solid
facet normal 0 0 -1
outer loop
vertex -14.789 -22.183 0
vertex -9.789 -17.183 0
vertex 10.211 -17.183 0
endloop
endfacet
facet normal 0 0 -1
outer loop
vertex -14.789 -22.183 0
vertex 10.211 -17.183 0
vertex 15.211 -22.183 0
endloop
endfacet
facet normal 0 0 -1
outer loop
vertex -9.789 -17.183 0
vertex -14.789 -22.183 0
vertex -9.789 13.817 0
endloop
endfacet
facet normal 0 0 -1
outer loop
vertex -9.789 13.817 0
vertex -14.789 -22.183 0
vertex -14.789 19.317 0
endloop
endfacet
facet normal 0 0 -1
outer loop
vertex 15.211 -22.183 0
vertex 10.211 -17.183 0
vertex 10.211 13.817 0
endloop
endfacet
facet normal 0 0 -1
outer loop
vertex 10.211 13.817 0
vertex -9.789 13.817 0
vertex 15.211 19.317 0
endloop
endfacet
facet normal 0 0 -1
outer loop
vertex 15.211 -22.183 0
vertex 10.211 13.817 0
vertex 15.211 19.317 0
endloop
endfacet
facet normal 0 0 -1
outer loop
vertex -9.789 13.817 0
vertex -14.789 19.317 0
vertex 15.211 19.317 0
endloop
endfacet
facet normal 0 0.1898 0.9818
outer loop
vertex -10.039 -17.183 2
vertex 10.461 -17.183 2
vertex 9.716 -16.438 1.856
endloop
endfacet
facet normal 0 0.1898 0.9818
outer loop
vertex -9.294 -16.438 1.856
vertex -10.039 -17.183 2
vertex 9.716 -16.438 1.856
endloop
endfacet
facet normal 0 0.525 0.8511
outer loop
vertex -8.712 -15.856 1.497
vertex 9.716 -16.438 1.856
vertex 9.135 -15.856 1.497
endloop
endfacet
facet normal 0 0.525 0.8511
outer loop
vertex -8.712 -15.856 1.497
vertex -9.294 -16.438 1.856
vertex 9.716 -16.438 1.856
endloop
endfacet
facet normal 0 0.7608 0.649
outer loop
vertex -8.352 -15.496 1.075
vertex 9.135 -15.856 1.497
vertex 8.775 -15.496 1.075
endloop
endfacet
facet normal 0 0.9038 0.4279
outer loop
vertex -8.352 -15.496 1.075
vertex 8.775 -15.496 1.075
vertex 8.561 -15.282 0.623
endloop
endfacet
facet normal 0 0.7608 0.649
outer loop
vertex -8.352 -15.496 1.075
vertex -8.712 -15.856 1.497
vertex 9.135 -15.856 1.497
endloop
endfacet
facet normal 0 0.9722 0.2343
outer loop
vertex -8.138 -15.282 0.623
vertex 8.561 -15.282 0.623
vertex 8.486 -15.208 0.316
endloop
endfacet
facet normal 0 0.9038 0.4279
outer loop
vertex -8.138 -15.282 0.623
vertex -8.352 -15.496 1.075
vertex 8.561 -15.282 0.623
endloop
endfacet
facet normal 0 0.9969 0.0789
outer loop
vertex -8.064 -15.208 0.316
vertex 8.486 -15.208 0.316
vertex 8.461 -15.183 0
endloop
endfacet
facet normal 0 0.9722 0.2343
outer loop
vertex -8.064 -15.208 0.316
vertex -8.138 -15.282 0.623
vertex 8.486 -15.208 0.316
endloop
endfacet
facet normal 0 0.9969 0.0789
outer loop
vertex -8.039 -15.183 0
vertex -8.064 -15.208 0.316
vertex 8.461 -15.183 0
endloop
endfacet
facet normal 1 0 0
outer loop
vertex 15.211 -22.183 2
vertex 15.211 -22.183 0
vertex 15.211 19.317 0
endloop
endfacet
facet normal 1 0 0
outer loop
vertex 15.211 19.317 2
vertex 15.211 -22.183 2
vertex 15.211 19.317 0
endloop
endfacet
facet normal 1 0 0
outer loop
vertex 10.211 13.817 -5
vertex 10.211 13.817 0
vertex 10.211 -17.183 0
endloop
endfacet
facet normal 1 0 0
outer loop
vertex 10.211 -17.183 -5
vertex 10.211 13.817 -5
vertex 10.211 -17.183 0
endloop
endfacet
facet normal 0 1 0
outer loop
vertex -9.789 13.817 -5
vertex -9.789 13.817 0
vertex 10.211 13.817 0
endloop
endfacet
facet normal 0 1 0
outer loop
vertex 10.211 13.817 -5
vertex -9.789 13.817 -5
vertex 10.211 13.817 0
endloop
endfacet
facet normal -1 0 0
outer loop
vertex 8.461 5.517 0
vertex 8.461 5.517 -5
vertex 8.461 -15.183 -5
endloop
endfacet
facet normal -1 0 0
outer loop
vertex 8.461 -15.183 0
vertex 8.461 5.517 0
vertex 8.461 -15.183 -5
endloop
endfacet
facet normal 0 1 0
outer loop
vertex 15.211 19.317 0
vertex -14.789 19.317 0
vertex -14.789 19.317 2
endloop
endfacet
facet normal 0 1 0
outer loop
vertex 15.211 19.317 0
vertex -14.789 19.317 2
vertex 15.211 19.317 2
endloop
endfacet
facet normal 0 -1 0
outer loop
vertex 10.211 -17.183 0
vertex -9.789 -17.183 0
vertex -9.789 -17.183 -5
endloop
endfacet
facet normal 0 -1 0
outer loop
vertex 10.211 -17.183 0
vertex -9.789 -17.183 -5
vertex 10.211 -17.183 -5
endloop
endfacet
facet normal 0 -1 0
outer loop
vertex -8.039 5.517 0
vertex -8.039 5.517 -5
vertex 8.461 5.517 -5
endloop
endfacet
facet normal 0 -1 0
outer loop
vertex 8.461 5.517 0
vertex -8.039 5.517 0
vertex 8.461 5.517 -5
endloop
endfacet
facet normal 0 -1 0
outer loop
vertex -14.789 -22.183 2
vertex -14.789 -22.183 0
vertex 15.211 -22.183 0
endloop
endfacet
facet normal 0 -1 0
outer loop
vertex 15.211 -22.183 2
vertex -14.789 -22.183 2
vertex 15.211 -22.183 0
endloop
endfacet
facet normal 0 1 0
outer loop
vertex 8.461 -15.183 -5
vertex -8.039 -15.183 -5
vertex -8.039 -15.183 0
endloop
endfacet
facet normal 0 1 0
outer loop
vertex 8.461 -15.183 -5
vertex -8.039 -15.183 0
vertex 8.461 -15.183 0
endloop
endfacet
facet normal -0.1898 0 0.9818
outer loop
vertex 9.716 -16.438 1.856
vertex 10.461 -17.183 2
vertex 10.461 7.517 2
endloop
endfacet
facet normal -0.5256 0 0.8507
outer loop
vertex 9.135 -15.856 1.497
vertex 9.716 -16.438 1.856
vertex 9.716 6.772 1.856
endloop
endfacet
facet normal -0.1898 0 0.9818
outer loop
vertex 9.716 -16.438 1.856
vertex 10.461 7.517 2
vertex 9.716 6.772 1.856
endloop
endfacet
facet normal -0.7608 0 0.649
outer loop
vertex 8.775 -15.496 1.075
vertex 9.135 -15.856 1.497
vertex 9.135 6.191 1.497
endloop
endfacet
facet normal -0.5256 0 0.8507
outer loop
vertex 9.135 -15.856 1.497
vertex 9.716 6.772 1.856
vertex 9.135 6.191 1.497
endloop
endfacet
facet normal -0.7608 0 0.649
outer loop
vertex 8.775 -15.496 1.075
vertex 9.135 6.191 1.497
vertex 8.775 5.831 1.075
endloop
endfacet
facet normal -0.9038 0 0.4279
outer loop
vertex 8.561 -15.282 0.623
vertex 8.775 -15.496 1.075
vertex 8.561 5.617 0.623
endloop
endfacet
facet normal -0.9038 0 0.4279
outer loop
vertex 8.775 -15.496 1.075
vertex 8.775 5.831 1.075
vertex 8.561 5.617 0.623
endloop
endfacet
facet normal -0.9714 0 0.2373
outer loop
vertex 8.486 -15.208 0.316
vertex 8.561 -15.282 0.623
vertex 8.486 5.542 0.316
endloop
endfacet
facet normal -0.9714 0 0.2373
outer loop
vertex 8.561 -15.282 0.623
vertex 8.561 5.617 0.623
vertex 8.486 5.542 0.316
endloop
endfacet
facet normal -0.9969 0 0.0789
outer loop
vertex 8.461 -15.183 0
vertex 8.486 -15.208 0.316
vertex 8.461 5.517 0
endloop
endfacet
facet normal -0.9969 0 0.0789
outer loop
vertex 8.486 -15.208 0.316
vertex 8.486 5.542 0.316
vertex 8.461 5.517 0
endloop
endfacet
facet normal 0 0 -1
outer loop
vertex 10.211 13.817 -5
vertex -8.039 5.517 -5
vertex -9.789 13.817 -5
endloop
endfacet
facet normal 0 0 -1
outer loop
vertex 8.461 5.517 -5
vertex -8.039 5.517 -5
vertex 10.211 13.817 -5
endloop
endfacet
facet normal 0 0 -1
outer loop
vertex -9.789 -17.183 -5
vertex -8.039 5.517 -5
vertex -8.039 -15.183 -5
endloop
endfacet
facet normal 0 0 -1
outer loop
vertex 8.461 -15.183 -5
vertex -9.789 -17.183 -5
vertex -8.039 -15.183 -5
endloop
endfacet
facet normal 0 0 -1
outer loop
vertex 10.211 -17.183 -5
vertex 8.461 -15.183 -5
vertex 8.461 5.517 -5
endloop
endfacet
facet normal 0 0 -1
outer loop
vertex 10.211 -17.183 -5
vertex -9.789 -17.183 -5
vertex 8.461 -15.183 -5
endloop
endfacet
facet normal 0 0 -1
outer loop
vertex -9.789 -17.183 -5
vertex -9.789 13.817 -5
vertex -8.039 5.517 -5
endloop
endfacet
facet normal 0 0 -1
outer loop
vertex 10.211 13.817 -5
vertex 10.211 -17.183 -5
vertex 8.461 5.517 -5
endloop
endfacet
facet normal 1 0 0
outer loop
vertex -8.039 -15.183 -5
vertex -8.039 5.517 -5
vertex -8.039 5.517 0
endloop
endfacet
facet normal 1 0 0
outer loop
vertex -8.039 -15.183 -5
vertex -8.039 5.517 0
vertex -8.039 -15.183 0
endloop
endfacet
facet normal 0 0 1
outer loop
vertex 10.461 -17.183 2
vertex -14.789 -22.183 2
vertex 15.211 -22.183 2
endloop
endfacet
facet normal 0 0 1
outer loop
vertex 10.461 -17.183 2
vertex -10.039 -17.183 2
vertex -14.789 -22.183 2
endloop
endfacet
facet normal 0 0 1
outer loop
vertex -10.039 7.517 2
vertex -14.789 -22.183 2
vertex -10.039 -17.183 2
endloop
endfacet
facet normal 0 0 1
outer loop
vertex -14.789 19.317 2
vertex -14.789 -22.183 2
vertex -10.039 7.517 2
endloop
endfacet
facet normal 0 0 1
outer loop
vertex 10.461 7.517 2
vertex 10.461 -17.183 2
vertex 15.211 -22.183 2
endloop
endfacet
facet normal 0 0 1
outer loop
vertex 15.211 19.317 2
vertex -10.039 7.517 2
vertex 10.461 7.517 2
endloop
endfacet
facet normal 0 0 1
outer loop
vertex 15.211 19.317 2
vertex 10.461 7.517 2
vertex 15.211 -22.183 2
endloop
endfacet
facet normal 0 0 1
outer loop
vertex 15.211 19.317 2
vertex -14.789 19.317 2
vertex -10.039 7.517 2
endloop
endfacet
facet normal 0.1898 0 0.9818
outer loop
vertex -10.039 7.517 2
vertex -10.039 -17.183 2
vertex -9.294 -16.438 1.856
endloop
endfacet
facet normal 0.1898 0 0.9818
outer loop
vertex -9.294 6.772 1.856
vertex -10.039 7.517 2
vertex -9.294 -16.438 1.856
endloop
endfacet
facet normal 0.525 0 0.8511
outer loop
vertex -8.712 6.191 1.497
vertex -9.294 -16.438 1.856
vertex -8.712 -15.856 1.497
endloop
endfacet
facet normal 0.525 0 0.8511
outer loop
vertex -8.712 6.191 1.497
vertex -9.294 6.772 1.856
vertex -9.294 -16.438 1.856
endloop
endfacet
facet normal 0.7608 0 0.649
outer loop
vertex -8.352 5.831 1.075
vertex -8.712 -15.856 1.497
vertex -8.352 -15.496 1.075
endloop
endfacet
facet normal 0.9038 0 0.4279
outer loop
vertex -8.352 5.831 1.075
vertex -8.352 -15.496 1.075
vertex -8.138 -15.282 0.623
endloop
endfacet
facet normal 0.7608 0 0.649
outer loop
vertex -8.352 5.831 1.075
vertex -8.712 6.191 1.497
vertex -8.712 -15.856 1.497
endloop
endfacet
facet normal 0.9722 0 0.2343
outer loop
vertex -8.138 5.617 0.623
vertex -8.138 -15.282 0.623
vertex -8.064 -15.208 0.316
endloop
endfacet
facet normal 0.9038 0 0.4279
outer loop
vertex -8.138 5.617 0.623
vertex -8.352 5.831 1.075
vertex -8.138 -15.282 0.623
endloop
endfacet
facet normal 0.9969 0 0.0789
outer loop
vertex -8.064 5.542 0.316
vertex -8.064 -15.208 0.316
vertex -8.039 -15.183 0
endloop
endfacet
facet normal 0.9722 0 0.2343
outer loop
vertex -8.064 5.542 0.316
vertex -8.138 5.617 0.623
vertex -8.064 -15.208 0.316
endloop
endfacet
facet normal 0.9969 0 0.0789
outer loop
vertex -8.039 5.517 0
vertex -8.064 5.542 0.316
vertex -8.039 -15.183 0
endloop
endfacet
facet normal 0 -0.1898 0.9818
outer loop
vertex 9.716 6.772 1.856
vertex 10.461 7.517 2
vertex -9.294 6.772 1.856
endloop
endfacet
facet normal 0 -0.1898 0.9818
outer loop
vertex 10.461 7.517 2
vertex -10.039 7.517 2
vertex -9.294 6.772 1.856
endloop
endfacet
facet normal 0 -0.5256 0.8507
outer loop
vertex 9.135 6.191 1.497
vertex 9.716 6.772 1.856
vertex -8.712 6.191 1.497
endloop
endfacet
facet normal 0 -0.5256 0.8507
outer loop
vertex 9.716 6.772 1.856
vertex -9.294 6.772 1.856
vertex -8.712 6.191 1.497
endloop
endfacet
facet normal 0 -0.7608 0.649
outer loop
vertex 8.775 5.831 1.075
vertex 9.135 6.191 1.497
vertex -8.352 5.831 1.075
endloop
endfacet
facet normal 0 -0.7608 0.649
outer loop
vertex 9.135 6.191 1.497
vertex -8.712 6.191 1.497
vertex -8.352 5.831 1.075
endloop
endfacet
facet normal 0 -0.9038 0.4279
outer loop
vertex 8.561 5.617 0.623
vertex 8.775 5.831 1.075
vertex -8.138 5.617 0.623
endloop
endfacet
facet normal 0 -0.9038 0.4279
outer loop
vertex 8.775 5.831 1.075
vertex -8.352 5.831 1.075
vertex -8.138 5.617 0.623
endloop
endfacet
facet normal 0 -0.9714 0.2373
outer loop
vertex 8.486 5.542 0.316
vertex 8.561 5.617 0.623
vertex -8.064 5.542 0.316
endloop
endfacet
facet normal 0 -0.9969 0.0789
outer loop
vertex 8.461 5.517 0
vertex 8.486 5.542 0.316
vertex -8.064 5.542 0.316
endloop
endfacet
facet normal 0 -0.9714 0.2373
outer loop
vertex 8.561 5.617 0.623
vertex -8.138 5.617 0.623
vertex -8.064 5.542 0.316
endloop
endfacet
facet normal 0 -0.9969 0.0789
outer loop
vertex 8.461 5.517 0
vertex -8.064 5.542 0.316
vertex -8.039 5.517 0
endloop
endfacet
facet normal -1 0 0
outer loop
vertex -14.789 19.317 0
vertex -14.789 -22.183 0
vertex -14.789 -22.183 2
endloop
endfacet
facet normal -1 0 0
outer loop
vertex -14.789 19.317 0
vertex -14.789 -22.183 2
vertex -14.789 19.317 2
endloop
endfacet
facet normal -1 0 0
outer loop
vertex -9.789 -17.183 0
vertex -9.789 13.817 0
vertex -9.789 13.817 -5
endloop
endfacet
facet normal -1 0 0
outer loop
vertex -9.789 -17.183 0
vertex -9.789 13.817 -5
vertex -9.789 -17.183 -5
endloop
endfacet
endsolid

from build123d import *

# Parameters (mm, degrees)
F0_W     = 30
F0_H     = 41.5
F1_DEPTH = 2
F2_W     = 20
F2_H     = 31
F3_DEPTH = 5
F4_W     = 16.5
F4_H     = 20.7
F5_DEPTH = 25
F6_R     = 2


with BuildPart() as f1:
    # F0 (on Top) → F1 (new body)
    with BuildSketch(Plane.XY):
        with Locations((0.211424, -1.432606)):
            Rectangle(F0_W, F0_H)
    extrude(amount=F1_DEPTH)

    # F2 (on face) → F3 (join)
    with BuildSketch(Plane(origin=(0, 0, 0), x_dir=(1, 0, 0), z_dir=(0, 0, -1))):
        with Locations((0.211424, 1.682606)):
            Rectangle(F2_W, F2_H)
    extrude(amount=F3_DEPTH)

    # F4 (on face) → F5 (cut)
    with BuildSketch(Plane(origin=(0, 0, -5), x_dir=(1, 0, 0), z_dir=(0, 0, -1))):
        with Locations((0.211424, 4.832606)):
            Rectangle(F4_W, F4_H)
    extrude(amount=-F5_DEPTH, mode=Mode.SUBTRACT)

    # F6
    f6_edges = [f1.edges().sort_by_distance(p)[0] for p in [
        (8.461424, -4.832606, 2),
        (0.211424, 5.517394, 2),
        (-8.038576, -4.832606, 2),
        (0.211424, -15.182606, 2),
    ]]
    fillet(f6_edges, radius=F6_R)


solid = f1.part
